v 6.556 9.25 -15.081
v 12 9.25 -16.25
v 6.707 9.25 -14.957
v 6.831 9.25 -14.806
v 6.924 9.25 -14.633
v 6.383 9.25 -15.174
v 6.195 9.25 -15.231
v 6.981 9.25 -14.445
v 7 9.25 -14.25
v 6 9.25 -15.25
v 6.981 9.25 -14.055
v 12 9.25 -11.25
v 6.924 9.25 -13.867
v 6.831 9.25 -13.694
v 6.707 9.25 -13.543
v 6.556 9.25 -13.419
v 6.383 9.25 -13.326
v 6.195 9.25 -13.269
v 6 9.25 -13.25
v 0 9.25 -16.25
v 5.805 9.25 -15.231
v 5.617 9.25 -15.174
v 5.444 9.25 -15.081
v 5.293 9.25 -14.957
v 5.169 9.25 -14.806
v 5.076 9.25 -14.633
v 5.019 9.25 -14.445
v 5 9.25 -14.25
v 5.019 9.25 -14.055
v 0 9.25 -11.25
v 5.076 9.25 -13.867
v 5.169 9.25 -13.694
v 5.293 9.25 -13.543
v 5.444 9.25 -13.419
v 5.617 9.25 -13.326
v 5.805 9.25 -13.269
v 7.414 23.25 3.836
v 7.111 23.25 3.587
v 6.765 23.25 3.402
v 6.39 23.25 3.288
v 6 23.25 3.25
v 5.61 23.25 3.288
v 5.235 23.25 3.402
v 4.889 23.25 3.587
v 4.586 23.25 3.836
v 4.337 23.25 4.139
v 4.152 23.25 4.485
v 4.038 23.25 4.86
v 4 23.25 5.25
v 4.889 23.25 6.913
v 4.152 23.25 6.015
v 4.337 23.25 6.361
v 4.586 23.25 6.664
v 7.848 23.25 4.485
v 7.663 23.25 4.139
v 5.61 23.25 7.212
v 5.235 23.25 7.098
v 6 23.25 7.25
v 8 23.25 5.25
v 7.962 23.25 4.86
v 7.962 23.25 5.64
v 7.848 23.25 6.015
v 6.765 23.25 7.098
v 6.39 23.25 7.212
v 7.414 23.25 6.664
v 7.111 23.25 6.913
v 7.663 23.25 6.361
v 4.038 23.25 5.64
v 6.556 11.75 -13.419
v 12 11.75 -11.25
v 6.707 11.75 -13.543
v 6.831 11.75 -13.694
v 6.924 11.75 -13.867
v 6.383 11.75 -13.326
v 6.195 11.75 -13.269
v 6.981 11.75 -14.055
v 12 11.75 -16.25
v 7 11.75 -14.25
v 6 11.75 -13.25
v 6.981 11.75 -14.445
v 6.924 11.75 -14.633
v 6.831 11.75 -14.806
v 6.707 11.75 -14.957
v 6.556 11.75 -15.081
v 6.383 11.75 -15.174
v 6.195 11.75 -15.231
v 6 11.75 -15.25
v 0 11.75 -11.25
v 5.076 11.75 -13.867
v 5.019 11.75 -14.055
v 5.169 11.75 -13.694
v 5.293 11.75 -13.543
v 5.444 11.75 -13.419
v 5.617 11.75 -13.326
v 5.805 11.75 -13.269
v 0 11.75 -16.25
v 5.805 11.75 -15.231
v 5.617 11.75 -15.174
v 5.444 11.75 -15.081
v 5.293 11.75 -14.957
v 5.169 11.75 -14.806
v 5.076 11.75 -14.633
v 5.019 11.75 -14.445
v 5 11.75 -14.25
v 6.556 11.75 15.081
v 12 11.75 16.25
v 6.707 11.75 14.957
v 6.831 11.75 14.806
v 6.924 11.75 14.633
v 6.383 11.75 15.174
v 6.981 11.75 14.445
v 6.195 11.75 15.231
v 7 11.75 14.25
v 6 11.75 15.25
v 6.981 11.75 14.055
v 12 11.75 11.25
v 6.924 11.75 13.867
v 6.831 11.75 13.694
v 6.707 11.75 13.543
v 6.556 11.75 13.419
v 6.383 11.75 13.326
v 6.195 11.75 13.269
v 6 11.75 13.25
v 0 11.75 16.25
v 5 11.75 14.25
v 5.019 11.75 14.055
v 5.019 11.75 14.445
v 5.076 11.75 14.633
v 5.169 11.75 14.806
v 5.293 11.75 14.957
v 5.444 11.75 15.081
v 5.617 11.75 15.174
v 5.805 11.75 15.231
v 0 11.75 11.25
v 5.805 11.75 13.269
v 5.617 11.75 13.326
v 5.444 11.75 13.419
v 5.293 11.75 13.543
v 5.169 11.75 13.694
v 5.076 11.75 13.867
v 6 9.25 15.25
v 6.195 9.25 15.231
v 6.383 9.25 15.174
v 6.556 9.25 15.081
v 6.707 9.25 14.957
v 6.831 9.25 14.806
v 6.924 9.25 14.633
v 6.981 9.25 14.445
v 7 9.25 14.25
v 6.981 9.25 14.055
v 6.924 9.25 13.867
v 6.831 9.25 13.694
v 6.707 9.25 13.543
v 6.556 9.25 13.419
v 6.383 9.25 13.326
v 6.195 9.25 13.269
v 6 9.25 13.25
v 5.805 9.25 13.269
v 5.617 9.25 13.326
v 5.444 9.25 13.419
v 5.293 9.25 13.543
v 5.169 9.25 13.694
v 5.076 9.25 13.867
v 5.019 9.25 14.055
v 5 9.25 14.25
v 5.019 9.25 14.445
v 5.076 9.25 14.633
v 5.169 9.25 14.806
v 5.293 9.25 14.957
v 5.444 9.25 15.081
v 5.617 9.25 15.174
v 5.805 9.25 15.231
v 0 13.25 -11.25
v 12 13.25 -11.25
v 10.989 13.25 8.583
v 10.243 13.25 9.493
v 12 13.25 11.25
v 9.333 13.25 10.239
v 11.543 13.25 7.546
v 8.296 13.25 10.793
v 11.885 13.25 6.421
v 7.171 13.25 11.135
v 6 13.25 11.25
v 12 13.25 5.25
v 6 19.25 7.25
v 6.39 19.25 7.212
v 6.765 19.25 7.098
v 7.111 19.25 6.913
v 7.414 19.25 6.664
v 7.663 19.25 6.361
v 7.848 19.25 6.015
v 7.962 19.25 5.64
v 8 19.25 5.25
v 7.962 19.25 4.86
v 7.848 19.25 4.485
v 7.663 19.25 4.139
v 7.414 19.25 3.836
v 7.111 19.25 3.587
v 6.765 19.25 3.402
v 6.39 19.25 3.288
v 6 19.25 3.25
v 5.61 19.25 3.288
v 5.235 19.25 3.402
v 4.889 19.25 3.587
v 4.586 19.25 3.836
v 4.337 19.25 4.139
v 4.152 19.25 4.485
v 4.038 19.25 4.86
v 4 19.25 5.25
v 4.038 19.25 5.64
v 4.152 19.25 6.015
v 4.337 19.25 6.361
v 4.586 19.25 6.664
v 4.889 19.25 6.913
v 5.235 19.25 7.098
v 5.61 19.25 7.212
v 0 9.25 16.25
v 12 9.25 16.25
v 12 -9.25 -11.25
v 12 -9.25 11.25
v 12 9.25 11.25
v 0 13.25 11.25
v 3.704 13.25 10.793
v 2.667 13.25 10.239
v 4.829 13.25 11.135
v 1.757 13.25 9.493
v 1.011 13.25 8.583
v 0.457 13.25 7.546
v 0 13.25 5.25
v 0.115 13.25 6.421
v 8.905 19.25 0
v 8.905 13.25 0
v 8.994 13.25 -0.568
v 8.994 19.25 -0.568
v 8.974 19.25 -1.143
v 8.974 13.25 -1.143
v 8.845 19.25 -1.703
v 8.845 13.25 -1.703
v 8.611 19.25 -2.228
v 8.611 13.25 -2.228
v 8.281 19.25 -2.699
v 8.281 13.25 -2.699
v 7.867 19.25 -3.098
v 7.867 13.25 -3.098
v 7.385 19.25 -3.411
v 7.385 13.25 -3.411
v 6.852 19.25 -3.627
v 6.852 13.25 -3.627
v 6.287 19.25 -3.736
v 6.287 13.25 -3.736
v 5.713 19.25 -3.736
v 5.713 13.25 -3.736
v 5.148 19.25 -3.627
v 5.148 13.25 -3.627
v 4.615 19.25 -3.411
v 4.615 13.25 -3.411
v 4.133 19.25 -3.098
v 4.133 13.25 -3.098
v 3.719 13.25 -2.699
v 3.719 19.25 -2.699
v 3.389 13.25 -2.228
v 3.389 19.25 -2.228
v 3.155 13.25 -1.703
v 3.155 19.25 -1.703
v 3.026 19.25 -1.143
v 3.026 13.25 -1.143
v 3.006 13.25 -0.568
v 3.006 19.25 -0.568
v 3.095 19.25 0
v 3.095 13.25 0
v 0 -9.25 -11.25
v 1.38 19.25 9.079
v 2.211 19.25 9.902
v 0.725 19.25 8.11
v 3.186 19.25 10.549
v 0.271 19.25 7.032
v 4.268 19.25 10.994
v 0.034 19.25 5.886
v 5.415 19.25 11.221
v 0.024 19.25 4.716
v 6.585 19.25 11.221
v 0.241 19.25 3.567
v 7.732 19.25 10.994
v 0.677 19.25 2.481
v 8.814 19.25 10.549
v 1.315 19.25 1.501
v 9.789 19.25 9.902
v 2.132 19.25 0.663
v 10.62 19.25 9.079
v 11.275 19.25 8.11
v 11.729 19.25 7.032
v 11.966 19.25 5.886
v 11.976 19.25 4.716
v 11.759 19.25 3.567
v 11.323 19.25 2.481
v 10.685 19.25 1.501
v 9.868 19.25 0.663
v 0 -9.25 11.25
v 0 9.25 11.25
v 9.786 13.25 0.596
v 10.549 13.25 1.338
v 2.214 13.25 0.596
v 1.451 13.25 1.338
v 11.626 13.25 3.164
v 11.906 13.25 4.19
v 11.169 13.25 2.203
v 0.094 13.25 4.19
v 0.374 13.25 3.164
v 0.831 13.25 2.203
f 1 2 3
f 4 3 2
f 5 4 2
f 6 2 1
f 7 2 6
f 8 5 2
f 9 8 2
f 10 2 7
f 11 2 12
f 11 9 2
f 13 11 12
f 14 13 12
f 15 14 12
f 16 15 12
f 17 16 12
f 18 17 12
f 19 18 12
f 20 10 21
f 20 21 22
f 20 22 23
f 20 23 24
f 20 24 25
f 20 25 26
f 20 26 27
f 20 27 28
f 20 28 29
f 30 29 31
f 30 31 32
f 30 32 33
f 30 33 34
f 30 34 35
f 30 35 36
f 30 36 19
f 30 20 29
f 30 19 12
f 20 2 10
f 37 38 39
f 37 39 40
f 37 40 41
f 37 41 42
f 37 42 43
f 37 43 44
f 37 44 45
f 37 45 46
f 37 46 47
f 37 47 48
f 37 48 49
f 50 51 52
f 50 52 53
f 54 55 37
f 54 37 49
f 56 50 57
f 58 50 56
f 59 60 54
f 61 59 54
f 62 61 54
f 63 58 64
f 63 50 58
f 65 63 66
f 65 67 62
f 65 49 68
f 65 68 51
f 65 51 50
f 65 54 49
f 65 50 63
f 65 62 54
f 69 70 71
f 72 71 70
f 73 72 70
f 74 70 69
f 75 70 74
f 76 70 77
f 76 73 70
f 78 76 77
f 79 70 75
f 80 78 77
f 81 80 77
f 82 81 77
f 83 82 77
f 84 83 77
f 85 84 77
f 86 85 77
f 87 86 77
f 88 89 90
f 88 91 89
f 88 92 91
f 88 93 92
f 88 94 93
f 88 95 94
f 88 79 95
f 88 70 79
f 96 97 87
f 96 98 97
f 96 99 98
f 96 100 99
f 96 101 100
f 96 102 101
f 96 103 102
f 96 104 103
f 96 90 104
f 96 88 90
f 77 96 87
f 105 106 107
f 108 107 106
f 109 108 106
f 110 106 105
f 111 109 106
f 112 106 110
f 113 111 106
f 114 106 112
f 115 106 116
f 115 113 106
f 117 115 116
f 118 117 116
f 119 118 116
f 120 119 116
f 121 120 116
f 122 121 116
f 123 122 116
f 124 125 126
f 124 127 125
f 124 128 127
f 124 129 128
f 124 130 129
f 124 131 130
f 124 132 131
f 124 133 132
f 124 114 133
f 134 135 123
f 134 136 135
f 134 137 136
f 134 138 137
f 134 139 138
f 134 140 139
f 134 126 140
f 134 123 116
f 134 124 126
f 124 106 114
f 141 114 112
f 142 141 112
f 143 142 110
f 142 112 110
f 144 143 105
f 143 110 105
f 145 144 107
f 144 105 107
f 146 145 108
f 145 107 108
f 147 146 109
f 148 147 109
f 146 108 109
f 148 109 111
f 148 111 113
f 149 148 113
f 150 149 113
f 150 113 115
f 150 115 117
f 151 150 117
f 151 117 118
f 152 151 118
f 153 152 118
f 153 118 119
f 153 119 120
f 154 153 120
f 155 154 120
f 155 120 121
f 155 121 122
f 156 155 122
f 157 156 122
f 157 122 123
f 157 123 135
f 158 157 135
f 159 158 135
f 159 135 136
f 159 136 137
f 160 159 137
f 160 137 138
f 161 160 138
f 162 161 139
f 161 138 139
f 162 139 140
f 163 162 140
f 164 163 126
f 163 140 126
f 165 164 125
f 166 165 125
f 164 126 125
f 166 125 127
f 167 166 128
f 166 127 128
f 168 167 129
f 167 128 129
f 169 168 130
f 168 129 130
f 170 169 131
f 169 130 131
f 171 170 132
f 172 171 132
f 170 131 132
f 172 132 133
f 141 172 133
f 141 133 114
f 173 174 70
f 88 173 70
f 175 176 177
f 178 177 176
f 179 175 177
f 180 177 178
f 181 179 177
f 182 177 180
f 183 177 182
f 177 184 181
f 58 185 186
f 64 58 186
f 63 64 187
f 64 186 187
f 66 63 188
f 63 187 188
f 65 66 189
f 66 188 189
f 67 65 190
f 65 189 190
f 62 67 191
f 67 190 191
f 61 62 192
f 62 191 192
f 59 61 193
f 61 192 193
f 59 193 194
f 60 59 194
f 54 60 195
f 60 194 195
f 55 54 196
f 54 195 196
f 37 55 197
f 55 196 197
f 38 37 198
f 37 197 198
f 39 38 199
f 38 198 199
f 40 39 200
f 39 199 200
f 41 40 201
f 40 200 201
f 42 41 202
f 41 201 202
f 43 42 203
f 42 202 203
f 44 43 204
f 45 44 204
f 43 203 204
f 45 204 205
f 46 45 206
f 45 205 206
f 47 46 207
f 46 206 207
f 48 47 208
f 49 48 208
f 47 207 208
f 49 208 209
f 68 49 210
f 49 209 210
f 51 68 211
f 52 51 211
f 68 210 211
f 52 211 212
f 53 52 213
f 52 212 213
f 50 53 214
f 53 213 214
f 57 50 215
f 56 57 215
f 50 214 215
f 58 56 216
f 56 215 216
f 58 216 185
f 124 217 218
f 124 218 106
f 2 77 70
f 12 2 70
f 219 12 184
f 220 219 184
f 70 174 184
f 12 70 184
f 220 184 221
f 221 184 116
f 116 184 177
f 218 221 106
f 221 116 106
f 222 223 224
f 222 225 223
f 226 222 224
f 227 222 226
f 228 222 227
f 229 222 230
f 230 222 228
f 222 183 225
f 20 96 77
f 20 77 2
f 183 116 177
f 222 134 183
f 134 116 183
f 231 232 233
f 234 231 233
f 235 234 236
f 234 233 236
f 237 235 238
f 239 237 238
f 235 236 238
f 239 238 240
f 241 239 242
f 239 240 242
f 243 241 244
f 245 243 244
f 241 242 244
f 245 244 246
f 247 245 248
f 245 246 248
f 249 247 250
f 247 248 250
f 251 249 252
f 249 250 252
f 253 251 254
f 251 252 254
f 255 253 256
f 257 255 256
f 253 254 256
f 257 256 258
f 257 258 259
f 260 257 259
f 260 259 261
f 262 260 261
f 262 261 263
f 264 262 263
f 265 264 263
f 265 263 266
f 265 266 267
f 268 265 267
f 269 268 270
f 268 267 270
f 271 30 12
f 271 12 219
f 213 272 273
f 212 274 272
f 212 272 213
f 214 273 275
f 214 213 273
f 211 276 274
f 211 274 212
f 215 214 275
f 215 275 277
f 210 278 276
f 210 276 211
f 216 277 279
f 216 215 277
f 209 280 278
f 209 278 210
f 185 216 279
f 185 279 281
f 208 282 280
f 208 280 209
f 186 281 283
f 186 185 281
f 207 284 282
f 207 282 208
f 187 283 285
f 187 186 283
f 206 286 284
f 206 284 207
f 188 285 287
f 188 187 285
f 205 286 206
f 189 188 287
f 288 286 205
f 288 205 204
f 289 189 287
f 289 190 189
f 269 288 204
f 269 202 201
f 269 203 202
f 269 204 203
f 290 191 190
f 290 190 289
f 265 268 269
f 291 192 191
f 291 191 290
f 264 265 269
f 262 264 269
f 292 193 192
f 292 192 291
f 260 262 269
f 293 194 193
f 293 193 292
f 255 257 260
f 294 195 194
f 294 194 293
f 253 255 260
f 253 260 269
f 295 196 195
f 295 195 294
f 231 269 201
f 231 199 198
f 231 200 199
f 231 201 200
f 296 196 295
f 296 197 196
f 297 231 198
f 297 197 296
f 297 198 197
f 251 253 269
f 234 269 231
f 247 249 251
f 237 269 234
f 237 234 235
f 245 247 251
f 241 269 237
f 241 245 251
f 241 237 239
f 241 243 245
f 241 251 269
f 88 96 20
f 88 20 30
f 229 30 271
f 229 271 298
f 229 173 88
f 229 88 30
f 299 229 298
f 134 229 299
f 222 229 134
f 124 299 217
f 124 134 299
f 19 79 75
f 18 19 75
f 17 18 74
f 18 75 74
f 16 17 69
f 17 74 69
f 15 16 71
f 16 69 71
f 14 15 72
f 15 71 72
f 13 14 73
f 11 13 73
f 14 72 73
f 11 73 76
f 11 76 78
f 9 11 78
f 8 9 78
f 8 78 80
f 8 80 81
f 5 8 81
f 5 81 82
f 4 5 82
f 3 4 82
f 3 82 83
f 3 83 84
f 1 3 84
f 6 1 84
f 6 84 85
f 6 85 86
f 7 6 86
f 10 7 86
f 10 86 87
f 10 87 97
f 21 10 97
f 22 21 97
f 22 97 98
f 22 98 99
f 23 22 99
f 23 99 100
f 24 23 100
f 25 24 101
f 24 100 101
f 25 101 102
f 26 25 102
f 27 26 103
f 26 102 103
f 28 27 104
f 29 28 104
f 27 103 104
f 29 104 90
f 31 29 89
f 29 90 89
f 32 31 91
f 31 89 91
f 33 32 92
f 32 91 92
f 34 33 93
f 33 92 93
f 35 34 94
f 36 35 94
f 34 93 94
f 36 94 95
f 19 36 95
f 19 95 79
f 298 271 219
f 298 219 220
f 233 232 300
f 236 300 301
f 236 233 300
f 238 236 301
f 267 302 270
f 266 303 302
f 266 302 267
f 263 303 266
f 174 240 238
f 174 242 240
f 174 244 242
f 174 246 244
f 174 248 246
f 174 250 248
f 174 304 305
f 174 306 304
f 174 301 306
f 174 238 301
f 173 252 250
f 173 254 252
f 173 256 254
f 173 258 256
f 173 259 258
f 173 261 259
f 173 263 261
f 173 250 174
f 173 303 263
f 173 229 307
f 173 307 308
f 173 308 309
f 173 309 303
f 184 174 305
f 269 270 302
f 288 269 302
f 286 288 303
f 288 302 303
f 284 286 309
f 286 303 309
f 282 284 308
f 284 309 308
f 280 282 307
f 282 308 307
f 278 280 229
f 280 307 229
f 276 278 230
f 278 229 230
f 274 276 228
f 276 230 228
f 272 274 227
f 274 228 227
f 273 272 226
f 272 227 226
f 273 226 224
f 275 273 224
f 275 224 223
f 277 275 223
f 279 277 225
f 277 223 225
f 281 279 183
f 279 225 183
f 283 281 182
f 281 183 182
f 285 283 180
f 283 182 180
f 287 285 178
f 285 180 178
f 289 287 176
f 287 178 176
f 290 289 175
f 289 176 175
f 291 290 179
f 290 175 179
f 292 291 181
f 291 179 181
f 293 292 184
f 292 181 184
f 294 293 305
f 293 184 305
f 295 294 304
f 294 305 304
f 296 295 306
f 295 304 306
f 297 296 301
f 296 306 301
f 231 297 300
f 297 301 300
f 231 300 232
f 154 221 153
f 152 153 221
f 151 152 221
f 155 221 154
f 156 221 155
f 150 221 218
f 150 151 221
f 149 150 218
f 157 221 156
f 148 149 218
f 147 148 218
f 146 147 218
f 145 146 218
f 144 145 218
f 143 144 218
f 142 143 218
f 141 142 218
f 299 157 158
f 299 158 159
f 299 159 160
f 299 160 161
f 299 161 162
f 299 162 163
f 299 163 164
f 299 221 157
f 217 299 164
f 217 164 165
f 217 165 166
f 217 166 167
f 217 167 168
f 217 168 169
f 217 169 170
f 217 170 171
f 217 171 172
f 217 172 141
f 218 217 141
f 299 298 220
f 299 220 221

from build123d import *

# Parameters (mm, degrees)
EXTRUDE_1_DEPTH     = 12
EXTRUDE_2_DEPTH     = 6
SKETCH_3_R          = 2
EXTRUDE_3_DEPTH     = 4
SKETCH_4_R          = 1
CUT_EXTRUDE_1_DEPTH = 30.138677046


with BuildPart() as part:
    # 草圖1 → 填料-伸長1 (new body)
    with BuildSketch(Plane(origin=(0, 0, 0), x_dir=(0, 0, -1), z_dir=(1, 0, 0))):
        Polygon((11.25, 11.75), (16.25, 11.75), (16.25, 9.25), (11.25, 9.25), (11.25, -9.25), (-11.25, -9.25), (-11.25, 9.25), (-16.25, 9.25), (-16.25, 11.75), (-11.25, 11.75), (-11.25, 13.25), (11.25, 13.25), align=None)
    extrude(amount=EXTRUDE_1_DEPTH)

    # 草圖2 → 填料-伸長2 (add)
    with BuildSketch(Plane(origin=(0, 13.25, 0), x_dir=(1, 0, 0), z_dir=(0, 1, 0))):
        with BuildLine():
            ThreePointArc((3.09526249, 0), (6, -11.25), (8.90473751, 0))
            ThreePointArc((8.90473751, 0), (6, 3.75), (3.09526249, 0))
        make_face()
    extrude(amount=EXTRUDE_2_DEPTH)

    # 草圖3 → 填料-伸長3 (add)
    with BuildSketch(Plane(origin=(0, 19.25, 0), x_dir=(1, 0, 0), z_dir=(0, 1, 0))):
        with Locations(Location((6, -5.25, 0), (0, 0, 270))):
            Circle(SKETCH_3_R)
    extrude(amount=EXTRUDE_3_DEPTH)

    # 草圖4 → 除料-伸長1 (cut, through all)
    with BuildSketch(Plane(origin=(0, 11.75, 0), x_dir=(1, 0, 0), z_dir=(0, 1, 0))):
        with Locations(Location((6, -14.25, 0), (0, 0, 270))):
            Circle(SKETCH_4_R)
        with Locations(Location((6, 14.25, 0), (0, 0, 270))):
            Circle(SKETCH_4_R)
    extrude(amount=-CUT_EXTRUDE_1_DEPTH, mode=Mode.SUBTRACT)


solid = part.part
